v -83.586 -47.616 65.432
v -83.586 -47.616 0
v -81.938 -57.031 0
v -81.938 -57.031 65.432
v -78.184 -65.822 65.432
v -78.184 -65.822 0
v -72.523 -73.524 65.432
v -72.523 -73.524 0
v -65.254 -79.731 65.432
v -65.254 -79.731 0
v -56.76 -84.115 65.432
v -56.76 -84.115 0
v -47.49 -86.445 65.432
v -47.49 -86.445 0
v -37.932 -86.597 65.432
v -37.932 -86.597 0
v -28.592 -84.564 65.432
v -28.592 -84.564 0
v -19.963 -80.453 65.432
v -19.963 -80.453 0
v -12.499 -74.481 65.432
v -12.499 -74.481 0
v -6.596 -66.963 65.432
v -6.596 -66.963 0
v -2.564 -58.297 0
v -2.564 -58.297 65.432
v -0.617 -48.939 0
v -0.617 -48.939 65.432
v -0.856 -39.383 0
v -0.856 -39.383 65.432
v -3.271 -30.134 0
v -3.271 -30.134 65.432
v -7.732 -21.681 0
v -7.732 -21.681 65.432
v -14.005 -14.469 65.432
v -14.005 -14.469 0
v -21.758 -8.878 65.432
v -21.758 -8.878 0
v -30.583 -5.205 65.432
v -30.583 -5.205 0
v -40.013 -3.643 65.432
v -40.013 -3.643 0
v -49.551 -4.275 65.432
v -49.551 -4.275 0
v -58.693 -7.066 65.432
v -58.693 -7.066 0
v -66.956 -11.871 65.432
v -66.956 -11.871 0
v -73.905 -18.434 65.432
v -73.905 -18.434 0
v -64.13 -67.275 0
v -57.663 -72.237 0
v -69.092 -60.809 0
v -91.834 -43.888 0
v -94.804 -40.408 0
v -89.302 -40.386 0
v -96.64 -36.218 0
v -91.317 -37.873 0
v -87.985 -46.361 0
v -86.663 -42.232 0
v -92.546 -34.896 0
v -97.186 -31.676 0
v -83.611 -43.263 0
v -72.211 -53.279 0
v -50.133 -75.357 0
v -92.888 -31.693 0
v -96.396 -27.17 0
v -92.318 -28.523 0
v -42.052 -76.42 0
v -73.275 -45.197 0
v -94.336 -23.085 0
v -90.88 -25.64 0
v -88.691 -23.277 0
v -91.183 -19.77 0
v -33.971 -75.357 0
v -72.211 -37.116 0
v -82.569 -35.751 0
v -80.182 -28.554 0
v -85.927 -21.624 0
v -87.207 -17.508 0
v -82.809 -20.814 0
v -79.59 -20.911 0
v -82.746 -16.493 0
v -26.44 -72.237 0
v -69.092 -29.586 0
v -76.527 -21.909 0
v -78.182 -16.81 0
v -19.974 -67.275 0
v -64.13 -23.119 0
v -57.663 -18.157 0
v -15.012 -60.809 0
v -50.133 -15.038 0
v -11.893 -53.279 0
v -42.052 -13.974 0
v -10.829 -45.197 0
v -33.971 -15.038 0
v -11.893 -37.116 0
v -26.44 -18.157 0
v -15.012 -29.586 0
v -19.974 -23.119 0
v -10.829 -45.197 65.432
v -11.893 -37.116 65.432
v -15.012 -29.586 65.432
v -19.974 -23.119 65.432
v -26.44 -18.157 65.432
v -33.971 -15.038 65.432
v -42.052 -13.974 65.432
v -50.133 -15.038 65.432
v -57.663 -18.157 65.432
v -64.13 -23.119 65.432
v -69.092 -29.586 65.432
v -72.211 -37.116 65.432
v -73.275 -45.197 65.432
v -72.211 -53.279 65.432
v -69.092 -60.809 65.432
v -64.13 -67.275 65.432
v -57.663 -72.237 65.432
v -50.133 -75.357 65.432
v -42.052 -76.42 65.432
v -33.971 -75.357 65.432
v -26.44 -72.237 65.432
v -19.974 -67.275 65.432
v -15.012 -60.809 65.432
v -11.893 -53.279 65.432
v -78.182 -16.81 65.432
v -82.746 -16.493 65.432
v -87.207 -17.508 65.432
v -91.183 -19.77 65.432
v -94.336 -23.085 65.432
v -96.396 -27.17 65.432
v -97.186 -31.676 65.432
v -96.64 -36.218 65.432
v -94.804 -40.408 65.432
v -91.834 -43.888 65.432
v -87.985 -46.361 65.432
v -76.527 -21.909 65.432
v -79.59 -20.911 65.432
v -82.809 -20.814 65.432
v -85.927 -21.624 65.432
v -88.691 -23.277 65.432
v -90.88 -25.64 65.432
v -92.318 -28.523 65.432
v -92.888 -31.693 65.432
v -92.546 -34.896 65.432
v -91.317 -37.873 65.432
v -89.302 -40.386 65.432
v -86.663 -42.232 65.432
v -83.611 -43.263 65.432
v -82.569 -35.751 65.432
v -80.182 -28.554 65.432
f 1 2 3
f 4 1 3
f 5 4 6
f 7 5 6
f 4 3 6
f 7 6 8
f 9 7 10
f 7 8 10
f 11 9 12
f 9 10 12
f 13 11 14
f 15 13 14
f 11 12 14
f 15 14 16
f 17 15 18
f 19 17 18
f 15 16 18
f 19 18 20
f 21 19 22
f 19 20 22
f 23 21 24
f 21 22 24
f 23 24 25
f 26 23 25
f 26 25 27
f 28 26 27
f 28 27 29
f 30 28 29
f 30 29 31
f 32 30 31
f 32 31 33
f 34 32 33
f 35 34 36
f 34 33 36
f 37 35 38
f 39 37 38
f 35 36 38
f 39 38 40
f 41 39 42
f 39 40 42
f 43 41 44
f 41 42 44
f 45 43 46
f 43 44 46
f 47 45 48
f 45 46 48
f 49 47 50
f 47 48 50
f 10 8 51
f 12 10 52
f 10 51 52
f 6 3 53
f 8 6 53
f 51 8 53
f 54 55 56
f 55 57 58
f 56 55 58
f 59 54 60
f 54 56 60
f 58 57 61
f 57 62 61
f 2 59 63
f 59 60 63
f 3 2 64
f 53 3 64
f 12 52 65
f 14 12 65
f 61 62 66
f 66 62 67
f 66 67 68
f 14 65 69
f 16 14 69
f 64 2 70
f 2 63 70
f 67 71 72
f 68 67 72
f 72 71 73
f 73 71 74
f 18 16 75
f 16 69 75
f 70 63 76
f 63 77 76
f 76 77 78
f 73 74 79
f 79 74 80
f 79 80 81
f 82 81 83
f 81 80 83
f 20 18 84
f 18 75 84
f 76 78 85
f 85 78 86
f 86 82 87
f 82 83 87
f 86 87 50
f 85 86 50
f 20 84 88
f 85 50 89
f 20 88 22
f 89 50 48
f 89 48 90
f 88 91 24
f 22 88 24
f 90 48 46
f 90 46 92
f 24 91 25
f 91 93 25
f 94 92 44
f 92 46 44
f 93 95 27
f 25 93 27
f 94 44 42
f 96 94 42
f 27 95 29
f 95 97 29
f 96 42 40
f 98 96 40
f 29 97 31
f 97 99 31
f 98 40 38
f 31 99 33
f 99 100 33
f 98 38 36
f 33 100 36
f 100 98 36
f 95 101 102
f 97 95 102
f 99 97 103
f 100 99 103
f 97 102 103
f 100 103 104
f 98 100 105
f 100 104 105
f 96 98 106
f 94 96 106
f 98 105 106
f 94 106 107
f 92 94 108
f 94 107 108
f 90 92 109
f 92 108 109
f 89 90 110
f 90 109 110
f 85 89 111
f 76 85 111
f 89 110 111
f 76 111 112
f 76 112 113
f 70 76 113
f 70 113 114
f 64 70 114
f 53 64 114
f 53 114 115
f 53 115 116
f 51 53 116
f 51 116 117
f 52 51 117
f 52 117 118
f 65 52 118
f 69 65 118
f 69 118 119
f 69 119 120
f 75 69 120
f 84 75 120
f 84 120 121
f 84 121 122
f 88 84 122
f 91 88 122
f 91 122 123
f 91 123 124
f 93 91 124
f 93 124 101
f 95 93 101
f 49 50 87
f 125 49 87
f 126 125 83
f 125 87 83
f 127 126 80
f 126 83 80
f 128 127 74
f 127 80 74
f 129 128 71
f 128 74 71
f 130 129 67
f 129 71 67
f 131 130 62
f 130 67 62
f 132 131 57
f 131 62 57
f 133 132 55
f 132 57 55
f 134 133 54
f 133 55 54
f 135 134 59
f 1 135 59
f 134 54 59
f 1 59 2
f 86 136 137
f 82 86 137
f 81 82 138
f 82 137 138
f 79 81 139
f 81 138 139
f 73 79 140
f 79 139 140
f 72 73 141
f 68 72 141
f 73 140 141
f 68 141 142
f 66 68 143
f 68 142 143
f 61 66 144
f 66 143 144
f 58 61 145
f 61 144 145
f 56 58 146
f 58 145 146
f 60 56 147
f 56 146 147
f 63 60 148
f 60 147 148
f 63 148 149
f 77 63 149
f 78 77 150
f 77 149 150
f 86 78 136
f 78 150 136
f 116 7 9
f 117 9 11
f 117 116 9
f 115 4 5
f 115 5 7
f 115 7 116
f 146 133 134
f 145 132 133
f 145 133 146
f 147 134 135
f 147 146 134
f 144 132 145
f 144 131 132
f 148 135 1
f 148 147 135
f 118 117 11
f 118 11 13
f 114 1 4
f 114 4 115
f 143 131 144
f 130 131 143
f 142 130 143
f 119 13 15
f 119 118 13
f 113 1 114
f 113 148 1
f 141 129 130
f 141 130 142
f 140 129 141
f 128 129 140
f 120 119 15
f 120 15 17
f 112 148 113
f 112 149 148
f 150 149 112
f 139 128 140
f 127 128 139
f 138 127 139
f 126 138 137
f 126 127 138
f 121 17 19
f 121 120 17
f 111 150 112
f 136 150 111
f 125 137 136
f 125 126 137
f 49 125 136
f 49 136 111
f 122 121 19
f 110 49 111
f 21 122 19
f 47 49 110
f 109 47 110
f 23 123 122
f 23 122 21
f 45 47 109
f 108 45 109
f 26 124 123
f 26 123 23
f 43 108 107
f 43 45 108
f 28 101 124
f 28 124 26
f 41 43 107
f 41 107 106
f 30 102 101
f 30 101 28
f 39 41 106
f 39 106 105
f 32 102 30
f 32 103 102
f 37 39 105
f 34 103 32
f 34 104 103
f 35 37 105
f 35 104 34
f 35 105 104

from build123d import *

# Parameters (mm, degrees)
F1_DEPTH = 65.43193
F2_R     = 31.223032
F3_DEPTH = 109.98878
F5_DEPTH = 101.69795


with BuildPart() as f1:
    # F0 (on Top) → F1 (new body)
    with BuildSketch(Plane.XY):
        with BuildLine():
            ThreePointArc((-73.905277, -18.434329), (-96.395829, -27.169836), (-83.585647, -47.615697))
            ThreePointArc((-83.585647, -47.615697), (-2.563987, -58.296785), (-73.905277, -18.434329))
        make_face()
    extrude(amount=F1_DEPTH)

    # F2 (on face) → F3 (cut)
    with BuildSketch(Plane.XY.offset(65.43193)):
        with Locations((-42.051967, -45.19739)):
            Circle(F2_R)
    extrude(amount=-F3_DEPTH, mode=Mode.SUBTRACT)

    # F4 (on face) → F5 (cut)
    with BuildSketch(Plane.XY.offset(65.43193)):
        with BuildLine():
            ThreePointArc((-83.611005, -43.263185), (-81.539948, -32.097995), (-76.527057, -21.908703))
            ThreePointArc((-76.527057, -21.908703), (-92.318031, -28.522569), (-83.611005, -43.263185))
        make_face()
    extrude(amount=-F5_DEPTH, mode=Mode.SUBTRACT)


solid = f1.part
